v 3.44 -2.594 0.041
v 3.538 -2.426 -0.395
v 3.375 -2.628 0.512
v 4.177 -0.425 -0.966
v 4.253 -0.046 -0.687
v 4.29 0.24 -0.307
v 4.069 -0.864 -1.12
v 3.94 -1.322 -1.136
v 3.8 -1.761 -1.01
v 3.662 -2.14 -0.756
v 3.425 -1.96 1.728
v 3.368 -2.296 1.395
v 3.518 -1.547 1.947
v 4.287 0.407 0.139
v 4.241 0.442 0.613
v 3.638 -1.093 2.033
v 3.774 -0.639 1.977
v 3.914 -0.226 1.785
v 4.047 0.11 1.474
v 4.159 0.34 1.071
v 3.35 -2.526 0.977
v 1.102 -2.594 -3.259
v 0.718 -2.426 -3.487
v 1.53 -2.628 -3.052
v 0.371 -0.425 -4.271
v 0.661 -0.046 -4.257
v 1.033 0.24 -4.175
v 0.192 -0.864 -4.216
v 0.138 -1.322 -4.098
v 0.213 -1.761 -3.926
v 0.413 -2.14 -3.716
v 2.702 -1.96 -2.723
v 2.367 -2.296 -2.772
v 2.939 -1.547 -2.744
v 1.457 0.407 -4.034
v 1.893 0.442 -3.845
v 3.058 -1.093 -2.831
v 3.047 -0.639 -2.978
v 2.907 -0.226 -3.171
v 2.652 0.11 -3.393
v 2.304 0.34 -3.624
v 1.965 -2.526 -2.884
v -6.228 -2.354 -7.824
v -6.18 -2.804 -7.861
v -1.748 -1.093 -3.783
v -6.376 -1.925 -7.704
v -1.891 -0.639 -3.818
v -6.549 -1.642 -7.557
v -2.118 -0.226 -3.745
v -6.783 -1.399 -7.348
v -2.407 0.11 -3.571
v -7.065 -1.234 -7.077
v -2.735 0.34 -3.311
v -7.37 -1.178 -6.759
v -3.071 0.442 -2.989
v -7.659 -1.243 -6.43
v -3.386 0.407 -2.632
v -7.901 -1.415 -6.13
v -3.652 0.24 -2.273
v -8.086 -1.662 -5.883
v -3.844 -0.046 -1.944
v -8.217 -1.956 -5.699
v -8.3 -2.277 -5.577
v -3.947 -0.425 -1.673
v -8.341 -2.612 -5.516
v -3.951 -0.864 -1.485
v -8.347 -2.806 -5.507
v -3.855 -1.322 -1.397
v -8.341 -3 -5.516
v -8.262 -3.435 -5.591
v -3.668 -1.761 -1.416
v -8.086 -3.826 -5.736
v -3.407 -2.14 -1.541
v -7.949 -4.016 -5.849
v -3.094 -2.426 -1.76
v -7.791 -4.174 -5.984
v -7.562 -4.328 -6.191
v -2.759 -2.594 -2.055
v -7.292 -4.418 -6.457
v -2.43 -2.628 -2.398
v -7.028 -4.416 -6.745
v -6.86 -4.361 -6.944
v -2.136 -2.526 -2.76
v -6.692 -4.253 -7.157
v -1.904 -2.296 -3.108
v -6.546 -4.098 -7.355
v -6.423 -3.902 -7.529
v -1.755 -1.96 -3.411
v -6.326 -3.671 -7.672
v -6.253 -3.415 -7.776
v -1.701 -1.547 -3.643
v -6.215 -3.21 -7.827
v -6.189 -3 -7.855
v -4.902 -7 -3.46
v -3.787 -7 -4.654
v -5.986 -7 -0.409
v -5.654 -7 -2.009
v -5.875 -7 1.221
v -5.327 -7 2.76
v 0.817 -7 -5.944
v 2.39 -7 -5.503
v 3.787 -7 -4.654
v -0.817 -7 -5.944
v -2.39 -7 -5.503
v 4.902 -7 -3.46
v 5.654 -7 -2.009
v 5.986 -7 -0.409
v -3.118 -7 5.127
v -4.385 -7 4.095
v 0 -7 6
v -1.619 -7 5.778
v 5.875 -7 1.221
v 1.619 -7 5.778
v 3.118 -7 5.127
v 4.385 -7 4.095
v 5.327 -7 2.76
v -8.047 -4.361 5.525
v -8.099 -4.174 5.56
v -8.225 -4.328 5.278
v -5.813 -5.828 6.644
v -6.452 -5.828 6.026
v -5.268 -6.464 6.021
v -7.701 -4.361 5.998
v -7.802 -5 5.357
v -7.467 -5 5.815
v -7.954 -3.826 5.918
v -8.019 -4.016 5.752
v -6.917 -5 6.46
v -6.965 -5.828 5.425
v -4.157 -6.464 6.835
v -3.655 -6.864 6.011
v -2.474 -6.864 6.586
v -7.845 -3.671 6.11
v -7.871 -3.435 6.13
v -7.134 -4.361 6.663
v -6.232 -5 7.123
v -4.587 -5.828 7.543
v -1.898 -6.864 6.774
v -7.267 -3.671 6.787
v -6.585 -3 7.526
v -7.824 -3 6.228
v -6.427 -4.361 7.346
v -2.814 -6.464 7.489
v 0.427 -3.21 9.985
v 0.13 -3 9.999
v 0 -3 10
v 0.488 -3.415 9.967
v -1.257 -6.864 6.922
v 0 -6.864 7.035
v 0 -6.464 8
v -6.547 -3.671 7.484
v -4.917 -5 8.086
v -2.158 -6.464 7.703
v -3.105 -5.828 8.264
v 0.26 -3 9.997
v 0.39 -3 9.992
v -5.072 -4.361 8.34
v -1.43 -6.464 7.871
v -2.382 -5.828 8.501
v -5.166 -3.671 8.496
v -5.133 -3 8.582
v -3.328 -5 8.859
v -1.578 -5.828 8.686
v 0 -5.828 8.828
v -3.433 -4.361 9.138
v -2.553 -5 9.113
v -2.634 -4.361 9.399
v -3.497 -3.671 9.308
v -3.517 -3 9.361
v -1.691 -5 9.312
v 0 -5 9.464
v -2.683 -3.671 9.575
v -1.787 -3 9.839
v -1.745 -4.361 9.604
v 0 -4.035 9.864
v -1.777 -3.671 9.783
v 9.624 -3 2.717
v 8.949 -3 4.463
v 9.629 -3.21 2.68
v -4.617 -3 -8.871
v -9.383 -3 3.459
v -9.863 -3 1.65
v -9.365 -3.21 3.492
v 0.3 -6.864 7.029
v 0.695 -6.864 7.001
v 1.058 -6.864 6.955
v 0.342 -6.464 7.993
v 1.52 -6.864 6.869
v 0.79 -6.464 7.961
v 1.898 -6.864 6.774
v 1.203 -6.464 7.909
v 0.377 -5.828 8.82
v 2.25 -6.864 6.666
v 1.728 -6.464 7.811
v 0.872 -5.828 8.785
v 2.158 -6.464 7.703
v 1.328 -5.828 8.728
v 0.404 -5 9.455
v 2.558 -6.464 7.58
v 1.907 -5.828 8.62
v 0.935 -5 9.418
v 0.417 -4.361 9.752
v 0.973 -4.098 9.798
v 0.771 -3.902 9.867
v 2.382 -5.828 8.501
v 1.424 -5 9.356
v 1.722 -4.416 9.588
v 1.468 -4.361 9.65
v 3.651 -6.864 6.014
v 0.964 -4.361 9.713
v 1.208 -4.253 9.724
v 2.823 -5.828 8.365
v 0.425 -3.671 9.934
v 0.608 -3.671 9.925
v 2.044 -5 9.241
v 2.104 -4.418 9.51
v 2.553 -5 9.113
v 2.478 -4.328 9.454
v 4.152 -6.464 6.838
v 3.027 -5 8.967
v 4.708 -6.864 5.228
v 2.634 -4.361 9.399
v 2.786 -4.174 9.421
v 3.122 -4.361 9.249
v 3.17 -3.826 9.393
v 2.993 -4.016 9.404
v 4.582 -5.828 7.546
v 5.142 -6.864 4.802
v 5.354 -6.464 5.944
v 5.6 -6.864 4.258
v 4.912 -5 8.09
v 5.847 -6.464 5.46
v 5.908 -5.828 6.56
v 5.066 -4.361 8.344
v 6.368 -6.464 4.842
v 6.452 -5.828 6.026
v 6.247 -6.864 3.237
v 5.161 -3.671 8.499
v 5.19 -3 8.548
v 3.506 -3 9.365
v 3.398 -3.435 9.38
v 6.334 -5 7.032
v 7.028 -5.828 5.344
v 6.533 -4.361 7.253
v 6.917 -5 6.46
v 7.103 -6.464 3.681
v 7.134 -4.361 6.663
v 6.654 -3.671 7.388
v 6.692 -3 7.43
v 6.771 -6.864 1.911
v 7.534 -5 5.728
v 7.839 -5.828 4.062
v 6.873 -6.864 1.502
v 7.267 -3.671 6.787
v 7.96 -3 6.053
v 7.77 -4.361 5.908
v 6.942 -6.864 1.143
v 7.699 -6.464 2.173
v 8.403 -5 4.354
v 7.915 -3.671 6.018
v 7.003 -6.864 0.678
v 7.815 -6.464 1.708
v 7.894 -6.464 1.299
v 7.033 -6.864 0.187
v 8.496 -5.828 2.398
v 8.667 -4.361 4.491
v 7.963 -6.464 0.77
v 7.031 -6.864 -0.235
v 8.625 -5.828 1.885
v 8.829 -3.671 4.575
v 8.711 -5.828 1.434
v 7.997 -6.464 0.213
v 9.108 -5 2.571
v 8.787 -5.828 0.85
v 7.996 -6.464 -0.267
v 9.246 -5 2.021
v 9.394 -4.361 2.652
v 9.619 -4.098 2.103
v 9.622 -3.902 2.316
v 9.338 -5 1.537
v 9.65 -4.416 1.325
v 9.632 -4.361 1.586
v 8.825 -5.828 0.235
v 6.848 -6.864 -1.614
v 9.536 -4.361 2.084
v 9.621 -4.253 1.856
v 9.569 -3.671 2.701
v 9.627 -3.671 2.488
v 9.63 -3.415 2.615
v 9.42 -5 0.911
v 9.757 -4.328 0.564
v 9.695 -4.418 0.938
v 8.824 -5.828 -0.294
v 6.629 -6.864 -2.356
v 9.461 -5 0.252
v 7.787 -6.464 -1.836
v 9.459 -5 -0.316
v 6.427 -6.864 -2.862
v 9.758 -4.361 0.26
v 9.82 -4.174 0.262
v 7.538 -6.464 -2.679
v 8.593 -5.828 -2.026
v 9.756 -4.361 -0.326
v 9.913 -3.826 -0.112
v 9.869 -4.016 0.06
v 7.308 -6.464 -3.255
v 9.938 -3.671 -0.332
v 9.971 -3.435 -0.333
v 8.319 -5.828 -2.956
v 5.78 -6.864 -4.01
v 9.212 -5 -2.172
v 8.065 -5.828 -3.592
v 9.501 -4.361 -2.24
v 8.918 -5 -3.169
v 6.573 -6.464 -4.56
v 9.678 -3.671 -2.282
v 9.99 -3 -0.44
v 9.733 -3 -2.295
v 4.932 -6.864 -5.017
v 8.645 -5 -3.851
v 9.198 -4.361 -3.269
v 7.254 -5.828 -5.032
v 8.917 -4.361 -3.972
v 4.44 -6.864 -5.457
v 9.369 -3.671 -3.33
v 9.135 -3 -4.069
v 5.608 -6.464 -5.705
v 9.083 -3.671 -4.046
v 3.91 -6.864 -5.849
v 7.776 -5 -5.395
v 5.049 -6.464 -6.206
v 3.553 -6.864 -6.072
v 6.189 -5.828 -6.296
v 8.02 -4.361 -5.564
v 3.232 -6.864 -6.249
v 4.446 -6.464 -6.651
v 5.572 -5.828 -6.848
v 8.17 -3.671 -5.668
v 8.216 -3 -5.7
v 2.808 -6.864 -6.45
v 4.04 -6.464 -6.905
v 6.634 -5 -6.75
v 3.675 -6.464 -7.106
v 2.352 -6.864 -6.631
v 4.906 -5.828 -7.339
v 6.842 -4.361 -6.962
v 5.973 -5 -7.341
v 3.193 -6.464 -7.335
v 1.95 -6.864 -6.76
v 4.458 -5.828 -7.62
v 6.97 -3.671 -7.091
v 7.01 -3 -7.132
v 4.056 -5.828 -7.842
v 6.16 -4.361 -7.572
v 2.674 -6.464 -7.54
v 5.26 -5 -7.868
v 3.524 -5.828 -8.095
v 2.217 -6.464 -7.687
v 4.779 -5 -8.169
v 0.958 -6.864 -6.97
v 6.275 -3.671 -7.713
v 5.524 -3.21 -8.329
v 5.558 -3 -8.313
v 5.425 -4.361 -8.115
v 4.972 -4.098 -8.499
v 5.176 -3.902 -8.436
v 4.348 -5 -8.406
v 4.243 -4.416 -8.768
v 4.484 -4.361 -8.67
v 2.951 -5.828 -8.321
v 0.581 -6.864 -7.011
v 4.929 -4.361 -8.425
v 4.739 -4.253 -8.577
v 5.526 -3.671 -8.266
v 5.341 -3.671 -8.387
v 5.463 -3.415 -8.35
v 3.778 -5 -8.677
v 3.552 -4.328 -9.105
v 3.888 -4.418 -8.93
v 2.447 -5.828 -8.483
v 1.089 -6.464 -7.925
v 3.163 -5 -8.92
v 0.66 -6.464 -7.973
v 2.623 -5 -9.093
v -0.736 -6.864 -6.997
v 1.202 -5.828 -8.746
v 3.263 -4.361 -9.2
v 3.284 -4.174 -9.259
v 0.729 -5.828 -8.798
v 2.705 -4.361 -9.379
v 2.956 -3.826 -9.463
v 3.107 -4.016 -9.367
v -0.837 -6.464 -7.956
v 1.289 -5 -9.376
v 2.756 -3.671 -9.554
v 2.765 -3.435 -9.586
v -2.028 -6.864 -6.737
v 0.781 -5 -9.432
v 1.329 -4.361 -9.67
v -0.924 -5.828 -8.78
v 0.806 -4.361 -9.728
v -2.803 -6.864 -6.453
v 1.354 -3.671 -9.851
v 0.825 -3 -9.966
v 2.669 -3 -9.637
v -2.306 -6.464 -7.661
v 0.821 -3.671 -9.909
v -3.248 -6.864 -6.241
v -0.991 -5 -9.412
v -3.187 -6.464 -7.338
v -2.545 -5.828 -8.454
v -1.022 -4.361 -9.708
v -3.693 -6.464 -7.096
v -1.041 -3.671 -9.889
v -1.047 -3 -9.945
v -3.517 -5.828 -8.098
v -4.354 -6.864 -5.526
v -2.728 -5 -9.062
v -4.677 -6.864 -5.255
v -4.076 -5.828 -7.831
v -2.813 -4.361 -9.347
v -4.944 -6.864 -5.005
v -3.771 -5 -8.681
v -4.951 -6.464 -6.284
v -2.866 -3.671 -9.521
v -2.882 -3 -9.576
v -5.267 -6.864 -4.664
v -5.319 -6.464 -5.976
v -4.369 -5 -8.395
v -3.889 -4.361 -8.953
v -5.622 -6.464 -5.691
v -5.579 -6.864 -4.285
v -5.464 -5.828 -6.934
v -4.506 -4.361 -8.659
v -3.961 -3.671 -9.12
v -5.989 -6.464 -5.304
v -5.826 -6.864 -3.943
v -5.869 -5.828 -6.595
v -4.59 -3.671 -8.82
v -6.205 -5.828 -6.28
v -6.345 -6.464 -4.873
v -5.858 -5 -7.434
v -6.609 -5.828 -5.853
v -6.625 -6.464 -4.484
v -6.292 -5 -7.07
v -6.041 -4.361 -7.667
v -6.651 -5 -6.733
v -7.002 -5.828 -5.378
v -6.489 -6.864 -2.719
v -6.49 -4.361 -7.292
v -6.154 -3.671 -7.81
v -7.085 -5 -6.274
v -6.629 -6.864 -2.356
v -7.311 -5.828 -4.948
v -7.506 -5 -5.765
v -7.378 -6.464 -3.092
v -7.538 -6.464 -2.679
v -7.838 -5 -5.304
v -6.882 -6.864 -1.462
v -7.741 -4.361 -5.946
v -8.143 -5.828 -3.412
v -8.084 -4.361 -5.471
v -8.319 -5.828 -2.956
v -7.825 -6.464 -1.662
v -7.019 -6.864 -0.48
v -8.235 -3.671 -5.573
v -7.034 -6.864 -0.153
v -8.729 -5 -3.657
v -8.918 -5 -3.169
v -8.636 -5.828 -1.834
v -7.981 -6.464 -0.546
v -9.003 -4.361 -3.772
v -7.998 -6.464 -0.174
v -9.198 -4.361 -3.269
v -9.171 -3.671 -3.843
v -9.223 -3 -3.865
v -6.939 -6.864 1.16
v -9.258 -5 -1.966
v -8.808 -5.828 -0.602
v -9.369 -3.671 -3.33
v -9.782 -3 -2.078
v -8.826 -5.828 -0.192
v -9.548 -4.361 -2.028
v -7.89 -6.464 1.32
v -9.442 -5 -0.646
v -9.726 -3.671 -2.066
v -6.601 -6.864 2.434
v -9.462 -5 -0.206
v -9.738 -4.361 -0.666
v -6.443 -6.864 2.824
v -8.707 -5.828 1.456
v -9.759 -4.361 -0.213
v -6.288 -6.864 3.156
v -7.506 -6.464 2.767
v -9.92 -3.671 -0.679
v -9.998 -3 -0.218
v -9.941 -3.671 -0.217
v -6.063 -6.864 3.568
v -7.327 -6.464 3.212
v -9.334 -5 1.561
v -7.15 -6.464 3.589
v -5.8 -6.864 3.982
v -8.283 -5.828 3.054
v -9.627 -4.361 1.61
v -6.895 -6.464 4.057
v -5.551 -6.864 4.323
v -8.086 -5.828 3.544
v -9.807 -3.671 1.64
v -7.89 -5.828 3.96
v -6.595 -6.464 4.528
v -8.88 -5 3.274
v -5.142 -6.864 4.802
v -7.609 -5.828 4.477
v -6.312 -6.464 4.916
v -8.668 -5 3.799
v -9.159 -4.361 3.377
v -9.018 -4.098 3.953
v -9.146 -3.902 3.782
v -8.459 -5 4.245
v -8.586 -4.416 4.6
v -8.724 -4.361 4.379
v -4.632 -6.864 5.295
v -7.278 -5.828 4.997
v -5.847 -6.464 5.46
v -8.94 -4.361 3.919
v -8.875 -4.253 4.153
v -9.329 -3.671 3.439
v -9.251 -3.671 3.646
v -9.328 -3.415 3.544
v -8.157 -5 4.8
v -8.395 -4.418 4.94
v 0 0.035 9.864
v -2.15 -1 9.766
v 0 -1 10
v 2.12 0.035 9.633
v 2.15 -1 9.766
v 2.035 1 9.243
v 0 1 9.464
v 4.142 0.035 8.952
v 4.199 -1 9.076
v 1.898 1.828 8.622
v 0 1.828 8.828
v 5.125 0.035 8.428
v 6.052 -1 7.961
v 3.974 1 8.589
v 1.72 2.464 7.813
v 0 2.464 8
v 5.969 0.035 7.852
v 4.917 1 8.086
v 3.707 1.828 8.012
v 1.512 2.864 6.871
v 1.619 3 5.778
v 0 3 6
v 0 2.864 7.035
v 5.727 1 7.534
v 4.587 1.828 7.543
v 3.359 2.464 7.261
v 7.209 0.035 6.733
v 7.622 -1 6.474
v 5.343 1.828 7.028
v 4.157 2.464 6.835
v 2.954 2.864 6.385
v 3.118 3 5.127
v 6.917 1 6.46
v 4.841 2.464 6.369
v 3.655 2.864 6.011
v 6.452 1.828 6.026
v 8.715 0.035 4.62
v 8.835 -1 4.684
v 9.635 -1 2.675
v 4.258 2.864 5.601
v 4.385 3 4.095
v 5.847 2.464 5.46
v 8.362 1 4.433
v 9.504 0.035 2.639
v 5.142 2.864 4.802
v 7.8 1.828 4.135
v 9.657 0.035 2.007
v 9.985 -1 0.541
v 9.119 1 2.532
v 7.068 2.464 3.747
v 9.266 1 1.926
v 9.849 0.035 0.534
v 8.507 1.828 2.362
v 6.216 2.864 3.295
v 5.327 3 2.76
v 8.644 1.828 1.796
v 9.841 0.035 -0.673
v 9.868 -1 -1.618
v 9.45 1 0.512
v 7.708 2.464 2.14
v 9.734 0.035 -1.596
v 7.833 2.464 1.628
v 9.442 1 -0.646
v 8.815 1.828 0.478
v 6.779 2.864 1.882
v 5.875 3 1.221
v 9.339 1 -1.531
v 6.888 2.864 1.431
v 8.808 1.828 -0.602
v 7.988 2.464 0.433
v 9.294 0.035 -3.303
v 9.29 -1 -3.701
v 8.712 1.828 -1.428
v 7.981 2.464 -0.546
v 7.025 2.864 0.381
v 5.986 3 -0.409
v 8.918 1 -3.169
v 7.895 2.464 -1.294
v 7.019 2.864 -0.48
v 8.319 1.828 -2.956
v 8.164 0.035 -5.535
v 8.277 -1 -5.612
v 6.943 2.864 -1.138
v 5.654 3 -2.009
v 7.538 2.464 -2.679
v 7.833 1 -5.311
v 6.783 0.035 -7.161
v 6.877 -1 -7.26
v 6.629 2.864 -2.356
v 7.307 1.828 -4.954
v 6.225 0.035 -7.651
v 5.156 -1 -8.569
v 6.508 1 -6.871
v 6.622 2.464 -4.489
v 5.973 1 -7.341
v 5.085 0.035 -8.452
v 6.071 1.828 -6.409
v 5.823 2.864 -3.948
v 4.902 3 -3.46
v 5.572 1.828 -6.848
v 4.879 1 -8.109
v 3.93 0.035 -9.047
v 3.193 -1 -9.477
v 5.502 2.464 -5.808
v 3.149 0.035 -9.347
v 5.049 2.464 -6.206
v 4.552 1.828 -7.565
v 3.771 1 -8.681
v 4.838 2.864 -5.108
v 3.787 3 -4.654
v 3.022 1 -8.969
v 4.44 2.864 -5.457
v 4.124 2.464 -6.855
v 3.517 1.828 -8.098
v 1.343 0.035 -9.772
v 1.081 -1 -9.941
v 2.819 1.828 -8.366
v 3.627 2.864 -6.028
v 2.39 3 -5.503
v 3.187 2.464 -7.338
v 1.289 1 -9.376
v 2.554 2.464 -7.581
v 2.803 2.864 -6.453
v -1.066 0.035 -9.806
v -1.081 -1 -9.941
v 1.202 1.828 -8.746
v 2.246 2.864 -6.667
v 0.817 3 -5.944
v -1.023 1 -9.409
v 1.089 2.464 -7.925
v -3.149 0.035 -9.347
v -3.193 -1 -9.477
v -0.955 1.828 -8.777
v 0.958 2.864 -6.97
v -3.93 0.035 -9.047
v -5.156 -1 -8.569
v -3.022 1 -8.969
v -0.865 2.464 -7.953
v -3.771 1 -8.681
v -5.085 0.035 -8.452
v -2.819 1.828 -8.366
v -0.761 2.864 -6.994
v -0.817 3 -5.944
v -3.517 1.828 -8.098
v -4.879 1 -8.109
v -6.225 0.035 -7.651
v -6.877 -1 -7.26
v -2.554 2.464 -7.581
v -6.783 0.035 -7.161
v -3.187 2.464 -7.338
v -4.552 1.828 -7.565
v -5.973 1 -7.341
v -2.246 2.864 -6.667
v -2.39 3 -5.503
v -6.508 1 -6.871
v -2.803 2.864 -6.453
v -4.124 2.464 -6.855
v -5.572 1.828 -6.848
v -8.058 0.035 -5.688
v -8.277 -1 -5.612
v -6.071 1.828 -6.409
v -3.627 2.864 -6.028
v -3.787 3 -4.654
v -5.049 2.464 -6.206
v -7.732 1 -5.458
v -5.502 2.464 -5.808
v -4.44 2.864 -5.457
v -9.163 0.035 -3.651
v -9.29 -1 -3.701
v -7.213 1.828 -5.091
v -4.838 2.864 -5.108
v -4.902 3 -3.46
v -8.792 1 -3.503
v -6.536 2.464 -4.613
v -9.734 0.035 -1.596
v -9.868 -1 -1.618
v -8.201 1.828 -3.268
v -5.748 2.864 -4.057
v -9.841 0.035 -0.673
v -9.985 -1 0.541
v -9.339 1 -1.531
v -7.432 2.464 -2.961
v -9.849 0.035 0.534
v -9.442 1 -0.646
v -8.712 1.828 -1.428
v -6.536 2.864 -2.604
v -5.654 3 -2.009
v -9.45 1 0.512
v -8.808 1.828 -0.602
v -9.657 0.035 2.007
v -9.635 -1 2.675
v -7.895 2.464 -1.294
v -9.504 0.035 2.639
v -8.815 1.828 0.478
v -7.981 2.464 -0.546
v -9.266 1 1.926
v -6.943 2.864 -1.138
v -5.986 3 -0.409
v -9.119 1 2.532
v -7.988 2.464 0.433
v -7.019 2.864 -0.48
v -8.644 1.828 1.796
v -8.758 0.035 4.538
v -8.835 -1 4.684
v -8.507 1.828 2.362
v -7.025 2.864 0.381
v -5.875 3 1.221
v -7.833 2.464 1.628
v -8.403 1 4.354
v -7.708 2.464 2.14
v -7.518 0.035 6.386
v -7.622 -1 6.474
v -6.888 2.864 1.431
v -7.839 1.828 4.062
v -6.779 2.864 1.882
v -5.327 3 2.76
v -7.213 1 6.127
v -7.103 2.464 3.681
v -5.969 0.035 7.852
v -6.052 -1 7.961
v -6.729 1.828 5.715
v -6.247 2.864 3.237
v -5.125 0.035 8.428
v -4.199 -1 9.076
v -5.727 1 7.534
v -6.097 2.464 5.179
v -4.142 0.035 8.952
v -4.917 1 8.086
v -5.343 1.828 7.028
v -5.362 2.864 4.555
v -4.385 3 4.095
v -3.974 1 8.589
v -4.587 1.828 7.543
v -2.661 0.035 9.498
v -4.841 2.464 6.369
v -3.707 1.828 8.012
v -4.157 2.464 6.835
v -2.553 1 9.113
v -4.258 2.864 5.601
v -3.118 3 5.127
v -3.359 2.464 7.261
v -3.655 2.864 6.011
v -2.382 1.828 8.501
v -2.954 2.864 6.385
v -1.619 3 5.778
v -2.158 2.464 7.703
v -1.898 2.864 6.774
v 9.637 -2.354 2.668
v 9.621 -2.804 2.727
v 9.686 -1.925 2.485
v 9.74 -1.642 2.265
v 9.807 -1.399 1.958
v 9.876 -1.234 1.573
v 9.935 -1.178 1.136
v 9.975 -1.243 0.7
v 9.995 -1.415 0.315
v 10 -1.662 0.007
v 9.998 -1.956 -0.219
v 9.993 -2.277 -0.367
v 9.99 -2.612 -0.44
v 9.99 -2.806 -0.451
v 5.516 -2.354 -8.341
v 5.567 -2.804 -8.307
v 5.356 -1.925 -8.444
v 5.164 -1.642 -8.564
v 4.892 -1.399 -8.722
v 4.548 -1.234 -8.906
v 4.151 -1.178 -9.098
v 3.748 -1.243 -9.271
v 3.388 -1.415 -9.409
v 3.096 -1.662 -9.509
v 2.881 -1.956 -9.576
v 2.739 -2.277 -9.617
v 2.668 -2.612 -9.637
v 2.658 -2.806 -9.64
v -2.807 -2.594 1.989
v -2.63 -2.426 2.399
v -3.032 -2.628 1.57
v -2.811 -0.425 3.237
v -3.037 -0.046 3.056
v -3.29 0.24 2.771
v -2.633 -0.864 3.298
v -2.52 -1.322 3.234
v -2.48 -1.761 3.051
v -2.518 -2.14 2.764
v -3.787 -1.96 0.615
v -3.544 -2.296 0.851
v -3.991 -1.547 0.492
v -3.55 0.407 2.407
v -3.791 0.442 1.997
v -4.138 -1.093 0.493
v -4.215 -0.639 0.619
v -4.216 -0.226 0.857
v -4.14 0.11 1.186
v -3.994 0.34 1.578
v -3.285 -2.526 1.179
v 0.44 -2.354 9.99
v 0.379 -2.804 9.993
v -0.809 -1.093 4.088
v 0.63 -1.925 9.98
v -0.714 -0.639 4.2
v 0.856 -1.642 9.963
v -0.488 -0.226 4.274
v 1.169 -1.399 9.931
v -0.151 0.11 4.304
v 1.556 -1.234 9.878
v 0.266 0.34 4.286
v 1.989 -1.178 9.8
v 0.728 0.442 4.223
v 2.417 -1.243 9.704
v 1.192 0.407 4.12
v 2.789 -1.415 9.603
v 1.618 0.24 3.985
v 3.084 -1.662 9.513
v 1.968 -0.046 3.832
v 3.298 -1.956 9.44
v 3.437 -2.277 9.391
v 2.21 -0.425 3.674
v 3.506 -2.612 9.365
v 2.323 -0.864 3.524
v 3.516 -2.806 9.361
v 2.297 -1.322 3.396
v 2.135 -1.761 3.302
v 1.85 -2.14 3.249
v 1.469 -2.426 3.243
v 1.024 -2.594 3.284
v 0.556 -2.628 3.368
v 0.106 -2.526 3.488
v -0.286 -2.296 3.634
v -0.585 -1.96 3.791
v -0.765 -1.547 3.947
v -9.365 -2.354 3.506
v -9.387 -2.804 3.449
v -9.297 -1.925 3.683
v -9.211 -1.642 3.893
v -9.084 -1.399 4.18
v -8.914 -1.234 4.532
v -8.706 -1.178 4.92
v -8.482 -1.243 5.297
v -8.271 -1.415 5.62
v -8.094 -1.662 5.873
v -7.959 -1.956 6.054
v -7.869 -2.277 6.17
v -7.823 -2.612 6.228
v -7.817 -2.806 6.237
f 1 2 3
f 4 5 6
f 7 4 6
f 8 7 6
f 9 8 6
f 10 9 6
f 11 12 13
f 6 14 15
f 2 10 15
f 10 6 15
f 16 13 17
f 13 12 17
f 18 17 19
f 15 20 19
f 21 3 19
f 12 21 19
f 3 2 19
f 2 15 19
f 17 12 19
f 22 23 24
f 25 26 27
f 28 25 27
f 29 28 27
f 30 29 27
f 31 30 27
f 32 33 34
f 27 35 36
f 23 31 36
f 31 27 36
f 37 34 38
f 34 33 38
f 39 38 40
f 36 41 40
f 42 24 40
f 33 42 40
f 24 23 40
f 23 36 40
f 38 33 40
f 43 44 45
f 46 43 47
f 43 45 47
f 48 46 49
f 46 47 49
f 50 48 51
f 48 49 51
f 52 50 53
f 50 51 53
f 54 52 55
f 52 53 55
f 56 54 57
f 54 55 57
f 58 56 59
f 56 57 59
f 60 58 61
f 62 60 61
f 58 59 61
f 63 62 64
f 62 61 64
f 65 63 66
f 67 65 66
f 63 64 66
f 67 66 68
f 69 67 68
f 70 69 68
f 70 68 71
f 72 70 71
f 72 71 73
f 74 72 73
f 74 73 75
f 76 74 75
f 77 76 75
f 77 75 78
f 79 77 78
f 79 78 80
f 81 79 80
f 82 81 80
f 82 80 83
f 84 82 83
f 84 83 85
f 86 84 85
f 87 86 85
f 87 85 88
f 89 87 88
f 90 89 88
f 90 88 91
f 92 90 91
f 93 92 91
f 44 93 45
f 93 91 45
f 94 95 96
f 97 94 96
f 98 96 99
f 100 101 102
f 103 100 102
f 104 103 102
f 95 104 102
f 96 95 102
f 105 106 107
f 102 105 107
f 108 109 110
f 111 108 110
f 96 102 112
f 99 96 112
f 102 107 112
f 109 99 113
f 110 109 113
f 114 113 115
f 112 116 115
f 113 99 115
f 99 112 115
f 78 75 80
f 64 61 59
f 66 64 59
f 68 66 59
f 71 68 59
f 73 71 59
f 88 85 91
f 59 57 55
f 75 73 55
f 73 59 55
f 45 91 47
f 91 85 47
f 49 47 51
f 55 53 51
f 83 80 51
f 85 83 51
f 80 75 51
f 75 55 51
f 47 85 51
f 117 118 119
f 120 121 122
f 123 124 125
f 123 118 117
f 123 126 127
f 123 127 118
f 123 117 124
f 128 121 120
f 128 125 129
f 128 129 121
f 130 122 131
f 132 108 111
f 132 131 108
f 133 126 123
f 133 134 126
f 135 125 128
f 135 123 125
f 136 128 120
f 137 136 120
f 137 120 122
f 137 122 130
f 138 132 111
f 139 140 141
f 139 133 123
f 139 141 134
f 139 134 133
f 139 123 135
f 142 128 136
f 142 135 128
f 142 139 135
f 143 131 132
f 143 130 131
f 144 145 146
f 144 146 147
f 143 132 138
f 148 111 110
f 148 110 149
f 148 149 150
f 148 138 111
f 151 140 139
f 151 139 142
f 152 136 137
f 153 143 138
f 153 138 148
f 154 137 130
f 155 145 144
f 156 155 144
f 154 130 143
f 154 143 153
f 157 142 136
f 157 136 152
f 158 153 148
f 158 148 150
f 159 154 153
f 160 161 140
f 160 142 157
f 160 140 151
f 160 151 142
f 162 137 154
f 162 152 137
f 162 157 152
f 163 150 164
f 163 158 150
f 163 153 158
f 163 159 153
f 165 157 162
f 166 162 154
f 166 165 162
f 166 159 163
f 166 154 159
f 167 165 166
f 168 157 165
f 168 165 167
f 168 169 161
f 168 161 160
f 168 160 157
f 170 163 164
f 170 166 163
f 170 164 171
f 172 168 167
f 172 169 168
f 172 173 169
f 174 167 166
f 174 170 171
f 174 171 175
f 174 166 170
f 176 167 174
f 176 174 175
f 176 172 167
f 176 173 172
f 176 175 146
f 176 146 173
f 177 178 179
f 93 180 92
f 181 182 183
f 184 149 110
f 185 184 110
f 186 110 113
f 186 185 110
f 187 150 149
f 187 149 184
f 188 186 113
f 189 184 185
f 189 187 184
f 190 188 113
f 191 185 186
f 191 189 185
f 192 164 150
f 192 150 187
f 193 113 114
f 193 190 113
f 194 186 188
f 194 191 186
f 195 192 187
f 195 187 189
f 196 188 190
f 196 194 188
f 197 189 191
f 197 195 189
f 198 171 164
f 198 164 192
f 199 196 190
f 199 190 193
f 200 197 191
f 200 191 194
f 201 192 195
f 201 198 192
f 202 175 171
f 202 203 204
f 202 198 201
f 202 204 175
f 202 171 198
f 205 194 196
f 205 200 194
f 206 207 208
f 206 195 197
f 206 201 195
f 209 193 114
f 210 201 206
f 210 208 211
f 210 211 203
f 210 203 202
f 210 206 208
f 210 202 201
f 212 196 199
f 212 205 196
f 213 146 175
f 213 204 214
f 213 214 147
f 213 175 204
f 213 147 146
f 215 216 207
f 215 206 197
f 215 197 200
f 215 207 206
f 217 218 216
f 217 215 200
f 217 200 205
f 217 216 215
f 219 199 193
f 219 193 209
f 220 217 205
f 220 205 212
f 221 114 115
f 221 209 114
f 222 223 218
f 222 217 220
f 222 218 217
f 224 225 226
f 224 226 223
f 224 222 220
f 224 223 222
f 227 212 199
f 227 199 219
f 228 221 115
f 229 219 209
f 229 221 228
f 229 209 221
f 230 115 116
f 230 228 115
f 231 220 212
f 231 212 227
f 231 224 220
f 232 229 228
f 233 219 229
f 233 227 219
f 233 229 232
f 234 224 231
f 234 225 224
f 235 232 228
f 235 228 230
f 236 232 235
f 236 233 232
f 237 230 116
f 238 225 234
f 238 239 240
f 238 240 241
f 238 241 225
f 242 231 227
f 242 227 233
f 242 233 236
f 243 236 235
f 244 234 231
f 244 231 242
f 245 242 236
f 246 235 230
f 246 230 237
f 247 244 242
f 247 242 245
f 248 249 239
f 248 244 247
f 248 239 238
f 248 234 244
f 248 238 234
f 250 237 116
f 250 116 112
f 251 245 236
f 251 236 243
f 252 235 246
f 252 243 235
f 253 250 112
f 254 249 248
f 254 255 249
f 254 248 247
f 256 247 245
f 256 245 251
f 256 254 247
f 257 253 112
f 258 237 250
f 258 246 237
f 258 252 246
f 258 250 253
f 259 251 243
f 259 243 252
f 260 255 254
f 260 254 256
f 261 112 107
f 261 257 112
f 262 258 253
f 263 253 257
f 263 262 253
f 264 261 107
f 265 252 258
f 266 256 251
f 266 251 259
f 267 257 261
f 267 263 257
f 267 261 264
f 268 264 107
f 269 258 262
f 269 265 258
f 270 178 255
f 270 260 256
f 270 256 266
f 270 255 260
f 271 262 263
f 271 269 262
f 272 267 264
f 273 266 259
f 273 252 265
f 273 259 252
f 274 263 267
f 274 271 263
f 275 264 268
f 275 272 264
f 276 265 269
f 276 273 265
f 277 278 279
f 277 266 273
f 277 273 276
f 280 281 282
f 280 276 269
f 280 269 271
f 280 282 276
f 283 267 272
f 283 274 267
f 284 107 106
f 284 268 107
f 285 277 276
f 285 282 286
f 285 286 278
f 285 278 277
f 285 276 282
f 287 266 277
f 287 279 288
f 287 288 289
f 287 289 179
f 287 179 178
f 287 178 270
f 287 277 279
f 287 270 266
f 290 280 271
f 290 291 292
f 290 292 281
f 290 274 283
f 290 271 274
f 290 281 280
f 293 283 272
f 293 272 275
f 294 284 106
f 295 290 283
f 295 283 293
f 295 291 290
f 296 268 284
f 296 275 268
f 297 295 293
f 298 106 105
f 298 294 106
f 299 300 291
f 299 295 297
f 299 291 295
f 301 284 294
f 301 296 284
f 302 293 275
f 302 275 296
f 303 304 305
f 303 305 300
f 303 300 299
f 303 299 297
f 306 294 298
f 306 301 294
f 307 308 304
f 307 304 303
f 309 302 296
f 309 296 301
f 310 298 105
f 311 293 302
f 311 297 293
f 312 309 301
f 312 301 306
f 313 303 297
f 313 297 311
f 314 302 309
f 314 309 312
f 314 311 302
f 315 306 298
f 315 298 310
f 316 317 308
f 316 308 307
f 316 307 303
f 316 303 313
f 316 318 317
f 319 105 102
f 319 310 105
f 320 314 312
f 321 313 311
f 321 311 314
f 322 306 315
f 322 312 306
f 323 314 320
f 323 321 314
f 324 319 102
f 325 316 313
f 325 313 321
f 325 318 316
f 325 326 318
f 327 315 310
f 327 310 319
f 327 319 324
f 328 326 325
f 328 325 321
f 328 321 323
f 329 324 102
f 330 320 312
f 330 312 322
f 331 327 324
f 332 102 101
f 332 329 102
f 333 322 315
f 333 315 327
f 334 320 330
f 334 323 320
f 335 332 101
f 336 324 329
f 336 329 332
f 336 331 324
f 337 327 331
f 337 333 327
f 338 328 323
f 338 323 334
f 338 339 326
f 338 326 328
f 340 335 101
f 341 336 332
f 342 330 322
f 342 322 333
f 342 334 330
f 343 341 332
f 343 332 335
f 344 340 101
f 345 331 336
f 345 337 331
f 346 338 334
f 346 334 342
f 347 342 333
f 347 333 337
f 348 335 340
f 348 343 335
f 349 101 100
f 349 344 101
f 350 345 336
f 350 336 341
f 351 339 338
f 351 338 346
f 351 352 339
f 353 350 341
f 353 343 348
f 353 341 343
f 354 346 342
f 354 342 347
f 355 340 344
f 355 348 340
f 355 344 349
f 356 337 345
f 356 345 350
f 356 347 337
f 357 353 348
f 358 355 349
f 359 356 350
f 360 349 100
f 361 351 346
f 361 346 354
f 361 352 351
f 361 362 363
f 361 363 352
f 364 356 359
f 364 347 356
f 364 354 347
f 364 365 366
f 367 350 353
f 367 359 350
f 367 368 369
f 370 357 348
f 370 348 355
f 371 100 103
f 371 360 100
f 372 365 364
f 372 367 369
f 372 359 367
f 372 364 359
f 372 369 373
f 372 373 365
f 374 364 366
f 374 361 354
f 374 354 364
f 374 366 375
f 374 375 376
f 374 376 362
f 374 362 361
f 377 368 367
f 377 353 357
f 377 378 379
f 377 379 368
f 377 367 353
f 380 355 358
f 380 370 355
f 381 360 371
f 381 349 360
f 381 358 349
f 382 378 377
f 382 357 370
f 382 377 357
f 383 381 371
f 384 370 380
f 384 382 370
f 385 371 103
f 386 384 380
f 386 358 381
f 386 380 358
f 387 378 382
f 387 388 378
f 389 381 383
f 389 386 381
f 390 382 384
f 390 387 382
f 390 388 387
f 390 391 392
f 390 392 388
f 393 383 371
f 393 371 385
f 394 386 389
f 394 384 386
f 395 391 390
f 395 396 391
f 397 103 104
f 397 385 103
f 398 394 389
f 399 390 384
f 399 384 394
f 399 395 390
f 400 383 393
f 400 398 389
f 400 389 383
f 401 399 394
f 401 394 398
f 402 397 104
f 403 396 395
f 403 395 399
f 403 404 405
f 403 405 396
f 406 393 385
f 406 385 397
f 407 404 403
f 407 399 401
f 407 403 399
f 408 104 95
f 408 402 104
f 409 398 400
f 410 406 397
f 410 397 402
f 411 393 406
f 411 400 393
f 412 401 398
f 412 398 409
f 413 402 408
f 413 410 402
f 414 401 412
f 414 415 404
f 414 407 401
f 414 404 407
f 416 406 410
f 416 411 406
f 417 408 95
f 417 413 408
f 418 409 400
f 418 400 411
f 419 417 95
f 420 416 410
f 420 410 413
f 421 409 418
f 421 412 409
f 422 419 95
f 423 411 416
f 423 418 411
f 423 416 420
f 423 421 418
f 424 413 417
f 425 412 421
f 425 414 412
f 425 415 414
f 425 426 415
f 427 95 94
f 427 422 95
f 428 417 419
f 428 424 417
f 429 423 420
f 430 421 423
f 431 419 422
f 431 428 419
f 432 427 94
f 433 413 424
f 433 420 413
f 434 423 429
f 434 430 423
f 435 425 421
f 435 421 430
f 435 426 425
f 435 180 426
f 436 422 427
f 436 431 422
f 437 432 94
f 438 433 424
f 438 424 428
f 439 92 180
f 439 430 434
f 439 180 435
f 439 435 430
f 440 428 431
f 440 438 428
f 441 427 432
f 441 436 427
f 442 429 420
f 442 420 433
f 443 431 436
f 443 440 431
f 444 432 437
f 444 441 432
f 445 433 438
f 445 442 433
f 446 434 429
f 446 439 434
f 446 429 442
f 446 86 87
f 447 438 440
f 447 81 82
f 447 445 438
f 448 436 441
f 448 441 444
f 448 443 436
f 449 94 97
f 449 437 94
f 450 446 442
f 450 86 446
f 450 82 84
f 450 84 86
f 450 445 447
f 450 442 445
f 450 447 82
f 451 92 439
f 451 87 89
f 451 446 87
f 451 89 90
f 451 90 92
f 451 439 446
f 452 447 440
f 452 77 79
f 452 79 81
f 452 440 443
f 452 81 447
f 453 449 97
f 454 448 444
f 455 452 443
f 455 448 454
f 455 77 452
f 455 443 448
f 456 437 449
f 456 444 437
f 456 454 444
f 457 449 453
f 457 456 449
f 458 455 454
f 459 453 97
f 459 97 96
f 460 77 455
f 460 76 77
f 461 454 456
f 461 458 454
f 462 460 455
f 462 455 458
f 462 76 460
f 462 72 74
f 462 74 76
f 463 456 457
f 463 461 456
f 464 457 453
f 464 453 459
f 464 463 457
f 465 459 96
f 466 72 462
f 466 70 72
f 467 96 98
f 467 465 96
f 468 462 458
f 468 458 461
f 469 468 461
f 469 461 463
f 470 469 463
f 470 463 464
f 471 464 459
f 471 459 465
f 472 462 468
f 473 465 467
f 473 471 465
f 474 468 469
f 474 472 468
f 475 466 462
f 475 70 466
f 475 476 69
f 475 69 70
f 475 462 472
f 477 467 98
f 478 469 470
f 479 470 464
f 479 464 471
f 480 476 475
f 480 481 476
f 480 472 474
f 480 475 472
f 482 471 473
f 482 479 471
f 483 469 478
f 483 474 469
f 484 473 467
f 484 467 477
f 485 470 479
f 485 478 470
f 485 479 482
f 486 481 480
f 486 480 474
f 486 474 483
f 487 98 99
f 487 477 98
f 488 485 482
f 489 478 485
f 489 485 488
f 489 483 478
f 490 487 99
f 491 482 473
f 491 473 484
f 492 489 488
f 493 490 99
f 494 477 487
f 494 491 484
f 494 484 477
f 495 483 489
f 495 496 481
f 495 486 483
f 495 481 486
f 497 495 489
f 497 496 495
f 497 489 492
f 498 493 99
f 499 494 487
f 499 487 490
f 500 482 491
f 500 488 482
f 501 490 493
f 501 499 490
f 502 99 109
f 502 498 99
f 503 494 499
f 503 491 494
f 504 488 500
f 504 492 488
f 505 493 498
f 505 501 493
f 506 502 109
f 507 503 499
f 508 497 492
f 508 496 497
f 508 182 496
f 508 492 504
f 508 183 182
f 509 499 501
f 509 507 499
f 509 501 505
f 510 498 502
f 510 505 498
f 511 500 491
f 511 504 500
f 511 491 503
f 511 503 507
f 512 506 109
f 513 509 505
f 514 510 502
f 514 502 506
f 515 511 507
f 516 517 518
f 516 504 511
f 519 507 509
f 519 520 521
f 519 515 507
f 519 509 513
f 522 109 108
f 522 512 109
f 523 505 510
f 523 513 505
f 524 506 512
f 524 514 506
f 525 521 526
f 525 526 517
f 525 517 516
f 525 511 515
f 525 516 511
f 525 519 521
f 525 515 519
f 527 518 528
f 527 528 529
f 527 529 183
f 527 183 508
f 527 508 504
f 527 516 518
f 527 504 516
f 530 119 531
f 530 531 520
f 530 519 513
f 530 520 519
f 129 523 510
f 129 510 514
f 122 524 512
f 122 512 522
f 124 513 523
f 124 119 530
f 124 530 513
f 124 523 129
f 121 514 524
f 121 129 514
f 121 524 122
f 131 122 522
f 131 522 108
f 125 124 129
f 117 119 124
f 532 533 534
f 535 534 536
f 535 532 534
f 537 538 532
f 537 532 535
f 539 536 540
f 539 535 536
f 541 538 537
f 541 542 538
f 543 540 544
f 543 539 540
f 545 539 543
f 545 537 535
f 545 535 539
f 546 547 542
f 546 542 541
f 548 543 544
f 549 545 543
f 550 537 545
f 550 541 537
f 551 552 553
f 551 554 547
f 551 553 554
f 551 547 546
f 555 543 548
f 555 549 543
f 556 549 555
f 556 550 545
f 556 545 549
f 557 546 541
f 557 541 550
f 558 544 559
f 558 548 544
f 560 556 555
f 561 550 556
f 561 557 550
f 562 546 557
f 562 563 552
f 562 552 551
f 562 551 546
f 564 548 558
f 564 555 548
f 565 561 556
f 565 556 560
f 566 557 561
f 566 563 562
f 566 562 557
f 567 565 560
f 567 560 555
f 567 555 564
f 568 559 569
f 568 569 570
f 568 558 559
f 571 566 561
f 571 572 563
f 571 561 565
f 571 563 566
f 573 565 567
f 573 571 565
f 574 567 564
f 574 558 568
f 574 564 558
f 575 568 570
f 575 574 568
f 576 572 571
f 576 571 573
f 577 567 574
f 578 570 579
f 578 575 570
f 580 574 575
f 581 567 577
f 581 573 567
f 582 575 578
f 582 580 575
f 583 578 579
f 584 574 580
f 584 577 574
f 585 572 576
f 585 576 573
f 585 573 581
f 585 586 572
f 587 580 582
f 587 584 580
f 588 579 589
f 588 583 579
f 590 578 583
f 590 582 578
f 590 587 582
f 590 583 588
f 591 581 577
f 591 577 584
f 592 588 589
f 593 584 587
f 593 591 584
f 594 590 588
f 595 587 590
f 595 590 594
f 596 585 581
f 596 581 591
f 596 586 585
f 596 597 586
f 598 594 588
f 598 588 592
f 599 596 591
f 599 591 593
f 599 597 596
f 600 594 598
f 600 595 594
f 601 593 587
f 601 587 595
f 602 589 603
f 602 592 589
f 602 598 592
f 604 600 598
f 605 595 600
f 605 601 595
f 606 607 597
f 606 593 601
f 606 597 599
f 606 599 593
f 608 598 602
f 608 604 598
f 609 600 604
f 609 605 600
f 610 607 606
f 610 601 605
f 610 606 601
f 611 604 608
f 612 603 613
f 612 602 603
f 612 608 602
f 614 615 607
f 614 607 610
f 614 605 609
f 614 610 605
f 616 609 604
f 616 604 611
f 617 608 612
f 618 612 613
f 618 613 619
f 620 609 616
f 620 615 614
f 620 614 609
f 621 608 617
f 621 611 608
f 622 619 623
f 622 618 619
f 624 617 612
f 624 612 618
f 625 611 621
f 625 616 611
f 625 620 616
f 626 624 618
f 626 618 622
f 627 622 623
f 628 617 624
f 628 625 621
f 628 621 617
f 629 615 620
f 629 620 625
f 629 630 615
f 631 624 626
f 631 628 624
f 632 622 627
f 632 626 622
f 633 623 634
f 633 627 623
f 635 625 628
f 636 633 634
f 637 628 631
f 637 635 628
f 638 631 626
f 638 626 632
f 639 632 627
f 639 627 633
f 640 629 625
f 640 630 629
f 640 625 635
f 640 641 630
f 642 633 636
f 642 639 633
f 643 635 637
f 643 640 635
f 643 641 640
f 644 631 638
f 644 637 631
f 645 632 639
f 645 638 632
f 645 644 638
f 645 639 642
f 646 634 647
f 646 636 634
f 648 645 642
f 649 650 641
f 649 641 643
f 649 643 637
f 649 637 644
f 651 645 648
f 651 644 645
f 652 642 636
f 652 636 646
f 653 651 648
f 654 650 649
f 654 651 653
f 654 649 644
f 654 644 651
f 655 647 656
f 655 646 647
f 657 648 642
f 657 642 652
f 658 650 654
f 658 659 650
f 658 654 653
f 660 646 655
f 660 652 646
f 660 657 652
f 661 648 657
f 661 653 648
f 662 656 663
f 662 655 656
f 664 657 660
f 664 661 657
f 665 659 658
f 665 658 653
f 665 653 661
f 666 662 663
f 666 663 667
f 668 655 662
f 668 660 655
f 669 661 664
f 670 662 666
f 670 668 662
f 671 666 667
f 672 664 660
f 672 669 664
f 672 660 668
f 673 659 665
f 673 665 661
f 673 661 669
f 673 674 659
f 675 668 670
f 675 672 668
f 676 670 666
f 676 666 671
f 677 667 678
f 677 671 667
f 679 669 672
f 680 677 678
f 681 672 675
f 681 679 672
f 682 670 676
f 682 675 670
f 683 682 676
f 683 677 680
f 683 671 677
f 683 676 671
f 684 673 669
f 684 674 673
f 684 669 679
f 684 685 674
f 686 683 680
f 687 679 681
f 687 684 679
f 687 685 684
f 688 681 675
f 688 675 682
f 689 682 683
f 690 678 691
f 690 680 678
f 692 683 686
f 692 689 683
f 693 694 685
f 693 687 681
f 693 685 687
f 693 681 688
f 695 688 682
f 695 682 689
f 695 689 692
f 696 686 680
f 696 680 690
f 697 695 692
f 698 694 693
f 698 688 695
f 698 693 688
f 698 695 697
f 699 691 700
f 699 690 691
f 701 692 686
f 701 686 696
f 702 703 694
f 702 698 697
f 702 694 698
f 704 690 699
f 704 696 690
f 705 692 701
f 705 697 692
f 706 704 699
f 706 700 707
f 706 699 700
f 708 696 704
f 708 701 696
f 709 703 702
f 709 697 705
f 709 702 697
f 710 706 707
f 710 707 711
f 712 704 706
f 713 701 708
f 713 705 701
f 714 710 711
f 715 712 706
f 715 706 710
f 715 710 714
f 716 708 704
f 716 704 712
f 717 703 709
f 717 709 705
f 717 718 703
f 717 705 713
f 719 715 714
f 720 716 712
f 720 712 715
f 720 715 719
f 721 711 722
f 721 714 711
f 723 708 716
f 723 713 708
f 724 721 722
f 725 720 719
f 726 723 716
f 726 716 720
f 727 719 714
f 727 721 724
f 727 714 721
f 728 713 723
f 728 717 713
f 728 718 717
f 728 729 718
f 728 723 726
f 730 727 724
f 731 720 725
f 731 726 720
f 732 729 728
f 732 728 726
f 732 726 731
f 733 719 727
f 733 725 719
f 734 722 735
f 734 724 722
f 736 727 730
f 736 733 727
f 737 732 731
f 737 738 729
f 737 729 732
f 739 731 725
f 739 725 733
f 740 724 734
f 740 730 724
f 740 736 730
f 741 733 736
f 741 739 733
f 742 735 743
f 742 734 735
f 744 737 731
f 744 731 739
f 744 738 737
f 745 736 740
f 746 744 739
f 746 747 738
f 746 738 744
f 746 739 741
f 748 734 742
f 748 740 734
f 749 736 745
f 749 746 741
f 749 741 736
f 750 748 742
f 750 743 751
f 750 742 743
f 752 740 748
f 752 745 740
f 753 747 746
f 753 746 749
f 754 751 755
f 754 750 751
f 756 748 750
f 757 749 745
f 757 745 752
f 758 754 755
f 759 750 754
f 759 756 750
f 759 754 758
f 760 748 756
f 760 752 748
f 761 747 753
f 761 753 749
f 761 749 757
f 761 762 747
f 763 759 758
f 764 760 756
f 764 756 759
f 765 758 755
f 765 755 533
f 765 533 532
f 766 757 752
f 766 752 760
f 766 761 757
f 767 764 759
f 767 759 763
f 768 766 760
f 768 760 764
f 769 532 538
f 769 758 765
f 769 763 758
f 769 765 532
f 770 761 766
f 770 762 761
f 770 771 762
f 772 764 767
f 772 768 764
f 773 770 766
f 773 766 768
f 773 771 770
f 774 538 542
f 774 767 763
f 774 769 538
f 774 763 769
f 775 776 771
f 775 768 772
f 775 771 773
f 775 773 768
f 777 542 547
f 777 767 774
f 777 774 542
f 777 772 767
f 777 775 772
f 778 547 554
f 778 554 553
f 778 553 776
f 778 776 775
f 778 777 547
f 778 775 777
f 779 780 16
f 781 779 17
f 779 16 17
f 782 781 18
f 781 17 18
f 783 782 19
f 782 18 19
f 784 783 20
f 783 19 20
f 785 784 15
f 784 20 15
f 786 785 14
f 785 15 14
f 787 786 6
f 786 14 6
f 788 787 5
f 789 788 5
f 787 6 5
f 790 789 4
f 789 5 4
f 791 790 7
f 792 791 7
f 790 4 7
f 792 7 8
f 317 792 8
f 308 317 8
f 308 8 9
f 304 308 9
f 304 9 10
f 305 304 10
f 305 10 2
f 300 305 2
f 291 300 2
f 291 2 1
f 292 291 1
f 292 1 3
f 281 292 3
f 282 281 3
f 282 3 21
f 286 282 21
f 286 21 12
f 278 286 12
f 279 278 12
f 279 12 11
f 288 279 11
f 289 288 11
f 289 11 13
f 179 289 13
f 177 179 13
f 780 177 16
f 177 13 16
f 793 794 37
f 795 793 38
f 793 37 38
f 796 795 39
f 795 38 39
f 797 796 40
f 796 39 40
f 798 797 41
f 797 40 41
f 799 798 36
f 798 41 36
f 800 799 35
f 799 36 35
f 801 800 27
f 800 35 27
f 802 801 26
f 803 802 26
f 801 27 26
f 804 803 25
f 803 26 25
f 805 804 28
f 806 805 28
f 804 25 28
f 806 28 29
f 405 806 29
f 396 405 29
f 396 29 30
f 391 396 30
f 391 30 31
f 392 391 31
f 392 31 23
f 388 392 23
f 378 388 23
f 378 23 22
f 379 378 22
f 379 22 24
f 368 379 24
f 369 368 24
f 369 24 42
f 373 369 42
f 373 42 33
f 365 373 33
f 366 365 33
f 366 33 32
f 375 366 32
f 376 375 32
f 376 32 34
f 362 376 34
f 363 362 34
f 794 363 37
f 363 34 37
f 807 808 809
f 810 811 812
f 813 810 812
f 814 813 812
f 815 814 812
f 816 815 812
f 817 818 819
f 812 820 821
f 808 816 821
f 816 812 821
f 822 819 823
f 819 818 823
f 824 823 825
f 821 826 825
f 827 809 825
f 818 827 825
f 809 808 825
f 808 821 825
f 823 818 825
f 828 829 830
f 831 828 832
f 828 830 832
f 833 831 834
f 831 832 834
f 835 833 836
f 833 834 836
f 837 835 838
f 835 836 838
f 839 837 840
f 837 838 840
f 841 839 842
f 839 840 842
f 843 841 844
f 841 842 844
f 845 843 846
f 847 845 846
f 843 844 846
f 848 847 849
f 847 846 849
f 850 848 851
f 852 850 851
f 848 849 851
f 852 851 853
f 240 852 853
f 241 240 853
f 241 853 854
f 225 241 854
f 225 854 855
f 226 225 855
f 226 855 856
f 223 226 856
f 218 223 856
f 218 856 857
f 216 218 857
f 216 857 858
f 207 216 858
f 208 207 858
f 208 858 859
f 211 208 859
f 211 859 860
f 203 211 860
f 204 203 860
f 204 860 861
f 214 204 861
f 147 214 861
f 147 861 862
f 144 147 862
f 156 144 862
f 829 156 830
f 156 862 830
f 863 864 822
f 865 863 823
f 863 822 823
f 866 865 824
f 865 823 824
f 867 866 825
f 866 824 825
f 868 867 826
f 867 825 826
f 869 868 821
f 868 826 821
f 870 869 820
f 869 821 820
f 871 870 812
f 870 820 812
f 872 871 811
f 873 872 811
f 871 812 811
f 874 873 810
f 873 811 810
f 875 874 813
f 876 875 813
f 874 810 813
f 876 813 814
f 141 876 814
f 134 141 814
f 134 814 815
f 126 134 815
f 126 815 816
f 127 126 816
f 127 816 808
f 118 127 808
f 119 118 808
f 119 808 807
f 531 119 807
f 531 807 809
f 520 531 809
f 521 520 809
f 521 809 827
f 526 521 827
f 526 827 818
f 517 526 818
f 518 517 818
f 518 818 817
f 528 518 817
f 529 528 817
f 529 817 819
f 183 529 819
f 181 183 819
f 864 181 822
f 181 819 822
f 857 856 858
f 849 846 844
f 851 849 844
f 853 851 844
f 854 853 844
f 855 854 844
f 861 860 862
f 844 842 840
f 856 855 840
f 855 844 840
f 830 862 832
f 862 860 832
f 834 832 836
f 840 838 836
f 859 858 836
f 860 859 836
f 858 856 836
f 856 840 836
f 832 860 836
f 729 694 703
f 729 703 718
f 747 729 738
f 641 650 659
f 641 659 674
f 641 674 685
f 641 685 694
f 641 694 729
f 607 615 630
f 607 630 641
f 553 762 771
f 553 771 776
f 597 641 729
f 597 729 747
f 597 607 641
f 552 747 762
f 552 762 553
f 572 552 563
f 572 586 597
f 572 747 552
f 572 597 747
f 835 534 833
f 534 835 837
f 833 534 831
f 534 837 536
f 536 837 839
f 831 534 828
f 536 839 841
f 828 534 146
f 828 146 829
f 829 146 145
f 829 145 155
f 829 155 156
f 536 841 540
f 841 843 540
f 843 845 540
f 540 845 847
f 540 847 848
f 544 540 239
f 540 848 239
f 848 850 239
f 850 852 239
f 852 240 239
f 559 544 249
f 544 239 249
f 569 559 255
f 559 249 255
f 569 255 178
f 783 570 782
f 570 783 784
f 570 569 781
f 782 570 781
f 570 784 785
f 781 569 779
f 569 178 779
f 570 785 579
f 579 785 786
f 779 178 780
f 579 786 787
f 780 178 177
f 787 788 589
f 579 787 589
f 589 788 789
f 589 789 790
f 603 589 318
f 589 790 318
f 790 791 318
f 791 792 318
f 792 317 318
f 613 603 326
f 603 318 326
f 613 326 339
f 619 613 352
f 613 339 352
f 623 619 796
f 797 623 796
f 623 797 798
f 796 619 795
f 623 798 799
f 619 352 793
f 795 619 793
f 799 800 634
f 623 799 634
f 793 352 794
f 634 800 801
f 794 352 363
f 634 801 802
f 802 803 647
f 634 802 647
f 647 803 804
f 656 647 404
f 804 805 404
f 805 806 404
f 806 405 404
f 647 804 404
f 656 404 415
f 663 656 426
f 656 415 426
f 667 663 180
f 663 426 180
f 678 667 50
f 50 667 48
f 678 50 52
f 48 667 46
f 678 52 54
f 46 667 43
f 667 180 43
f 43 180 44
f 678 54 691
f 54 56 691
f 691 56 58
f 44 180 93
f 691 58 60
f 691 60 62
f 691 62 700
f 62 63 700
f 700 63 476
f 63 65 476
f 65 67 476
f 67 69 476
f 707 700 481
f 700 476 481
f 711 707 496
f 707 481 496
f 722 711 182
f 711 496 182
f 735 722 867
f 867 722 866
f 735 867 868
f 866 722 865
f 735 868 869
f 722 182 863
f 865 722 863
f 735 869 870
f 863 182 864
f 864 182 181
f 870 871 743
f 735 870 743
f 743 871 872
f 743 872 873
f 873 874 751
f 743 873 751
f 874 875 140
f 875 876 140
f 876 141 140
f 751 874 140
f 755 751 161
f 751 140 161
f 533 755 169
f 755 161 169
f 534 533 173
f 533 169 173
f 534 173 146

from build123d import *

# Parameters (mm, degrees)
BOSS_EXTRUDE1_DEPTH      = 3
BOSS_EXTRUDE1_DEPTH_BACK = 7
SKETCH1_R                = 10
SKETCH4_R                = 1.6
HOLE_DEPTH               = 19.828402711
HOLECIR_COUNT            = 5
FILLET2_R                = 4


with BuildPart() as part:
    # Sketch1 → Boss-Extrude1 (new, two sides: drawn at the far end of the back side and taken through both)
    with BuildSketch(Plane(origin=(0, 0, 0), x_dir=(1, 0, 0), z_dir=(0, 1, 0)).offset(-BOSS_EXTRUDE1_DEPTH_BACK)):
        with Locations(Location((0, 0, 0), (0, 0, 270))):
            Circle(SKETCH1_R)
    extrude(amount=BOSS_EXTRUDE1_DEPTH + BOSS_EXTRUDE1_DEPTH_BACK)

    # Sketch4 → hole (cut, through all)
    with BuildSketch(Plane(origin=(-3.352872105, -1.093066116, 1.887711608), x_dir=(-0.4486862613641547, -0.14627571033740308, -0.8816371449912632), z_dir=(0.8382180262940947, 0.2732665289126682, -0.47192790187872385))):
        with Locations(Location((0, 0, 0), (0, 0, 8.746528197))):
            Circle(SKETCH4_R)
    hole = extrude(amount=-HOLE_DEPTH, mode=Mode.SUBTRACT)

    # holecir: hole ×5 about axis
    holecir_axis = Axis((0, 0, 0), (0, 1, 0))
    for i in range(1, HOLECIR_COUNT):
        add(hole.rotate(holecir_axis, i * 360 / HOLECIR_COUNT), mode=Mode.SUBTRACT)

    # Fillet2
    # the kernel refuses this fillet: 4 mm, written as the material it takes off along each edge
    with BuildSketch(Plane(origin=(0, -7, 0), x_dir=(0, 0, 1), z_dir=(-1, 0, 0))) as fillet2_piece_1:
        with BuildLine():
            CenterArc((10 - FILLET2_R, FILLET2_R), FILLET2_R, 270, 90)
            Line((10 - FILLET2_R, 0), (10, 0))
            Line((10, 0), (10, FILLET2_R))
        make_face()
    revolve(axis=Axis((0, -7, 0), (0, 1, 0)), mode=Mode.SUBTRACT)
    with BuildSketch(Plane(origin=(0, 3, 0), x_dir=(0, 0, 1), z_dir=(-1, 0, 0))) as fillet2_piece_2:
        with BuildLine():
            CenterArc((10 - FILLET2_R, -FILLET2_R), FILLET2_R, 0, 90)
            Line((10 - FILLET2_R, 0), (10, 0))
            Line((10, 0), (10, -FILLET2_R))
        make_face()
    revolve(axis=Axis((0, 3, 0), (0, 1, 0)), mode=Mode.SUBTRACT)


solid = part.part
